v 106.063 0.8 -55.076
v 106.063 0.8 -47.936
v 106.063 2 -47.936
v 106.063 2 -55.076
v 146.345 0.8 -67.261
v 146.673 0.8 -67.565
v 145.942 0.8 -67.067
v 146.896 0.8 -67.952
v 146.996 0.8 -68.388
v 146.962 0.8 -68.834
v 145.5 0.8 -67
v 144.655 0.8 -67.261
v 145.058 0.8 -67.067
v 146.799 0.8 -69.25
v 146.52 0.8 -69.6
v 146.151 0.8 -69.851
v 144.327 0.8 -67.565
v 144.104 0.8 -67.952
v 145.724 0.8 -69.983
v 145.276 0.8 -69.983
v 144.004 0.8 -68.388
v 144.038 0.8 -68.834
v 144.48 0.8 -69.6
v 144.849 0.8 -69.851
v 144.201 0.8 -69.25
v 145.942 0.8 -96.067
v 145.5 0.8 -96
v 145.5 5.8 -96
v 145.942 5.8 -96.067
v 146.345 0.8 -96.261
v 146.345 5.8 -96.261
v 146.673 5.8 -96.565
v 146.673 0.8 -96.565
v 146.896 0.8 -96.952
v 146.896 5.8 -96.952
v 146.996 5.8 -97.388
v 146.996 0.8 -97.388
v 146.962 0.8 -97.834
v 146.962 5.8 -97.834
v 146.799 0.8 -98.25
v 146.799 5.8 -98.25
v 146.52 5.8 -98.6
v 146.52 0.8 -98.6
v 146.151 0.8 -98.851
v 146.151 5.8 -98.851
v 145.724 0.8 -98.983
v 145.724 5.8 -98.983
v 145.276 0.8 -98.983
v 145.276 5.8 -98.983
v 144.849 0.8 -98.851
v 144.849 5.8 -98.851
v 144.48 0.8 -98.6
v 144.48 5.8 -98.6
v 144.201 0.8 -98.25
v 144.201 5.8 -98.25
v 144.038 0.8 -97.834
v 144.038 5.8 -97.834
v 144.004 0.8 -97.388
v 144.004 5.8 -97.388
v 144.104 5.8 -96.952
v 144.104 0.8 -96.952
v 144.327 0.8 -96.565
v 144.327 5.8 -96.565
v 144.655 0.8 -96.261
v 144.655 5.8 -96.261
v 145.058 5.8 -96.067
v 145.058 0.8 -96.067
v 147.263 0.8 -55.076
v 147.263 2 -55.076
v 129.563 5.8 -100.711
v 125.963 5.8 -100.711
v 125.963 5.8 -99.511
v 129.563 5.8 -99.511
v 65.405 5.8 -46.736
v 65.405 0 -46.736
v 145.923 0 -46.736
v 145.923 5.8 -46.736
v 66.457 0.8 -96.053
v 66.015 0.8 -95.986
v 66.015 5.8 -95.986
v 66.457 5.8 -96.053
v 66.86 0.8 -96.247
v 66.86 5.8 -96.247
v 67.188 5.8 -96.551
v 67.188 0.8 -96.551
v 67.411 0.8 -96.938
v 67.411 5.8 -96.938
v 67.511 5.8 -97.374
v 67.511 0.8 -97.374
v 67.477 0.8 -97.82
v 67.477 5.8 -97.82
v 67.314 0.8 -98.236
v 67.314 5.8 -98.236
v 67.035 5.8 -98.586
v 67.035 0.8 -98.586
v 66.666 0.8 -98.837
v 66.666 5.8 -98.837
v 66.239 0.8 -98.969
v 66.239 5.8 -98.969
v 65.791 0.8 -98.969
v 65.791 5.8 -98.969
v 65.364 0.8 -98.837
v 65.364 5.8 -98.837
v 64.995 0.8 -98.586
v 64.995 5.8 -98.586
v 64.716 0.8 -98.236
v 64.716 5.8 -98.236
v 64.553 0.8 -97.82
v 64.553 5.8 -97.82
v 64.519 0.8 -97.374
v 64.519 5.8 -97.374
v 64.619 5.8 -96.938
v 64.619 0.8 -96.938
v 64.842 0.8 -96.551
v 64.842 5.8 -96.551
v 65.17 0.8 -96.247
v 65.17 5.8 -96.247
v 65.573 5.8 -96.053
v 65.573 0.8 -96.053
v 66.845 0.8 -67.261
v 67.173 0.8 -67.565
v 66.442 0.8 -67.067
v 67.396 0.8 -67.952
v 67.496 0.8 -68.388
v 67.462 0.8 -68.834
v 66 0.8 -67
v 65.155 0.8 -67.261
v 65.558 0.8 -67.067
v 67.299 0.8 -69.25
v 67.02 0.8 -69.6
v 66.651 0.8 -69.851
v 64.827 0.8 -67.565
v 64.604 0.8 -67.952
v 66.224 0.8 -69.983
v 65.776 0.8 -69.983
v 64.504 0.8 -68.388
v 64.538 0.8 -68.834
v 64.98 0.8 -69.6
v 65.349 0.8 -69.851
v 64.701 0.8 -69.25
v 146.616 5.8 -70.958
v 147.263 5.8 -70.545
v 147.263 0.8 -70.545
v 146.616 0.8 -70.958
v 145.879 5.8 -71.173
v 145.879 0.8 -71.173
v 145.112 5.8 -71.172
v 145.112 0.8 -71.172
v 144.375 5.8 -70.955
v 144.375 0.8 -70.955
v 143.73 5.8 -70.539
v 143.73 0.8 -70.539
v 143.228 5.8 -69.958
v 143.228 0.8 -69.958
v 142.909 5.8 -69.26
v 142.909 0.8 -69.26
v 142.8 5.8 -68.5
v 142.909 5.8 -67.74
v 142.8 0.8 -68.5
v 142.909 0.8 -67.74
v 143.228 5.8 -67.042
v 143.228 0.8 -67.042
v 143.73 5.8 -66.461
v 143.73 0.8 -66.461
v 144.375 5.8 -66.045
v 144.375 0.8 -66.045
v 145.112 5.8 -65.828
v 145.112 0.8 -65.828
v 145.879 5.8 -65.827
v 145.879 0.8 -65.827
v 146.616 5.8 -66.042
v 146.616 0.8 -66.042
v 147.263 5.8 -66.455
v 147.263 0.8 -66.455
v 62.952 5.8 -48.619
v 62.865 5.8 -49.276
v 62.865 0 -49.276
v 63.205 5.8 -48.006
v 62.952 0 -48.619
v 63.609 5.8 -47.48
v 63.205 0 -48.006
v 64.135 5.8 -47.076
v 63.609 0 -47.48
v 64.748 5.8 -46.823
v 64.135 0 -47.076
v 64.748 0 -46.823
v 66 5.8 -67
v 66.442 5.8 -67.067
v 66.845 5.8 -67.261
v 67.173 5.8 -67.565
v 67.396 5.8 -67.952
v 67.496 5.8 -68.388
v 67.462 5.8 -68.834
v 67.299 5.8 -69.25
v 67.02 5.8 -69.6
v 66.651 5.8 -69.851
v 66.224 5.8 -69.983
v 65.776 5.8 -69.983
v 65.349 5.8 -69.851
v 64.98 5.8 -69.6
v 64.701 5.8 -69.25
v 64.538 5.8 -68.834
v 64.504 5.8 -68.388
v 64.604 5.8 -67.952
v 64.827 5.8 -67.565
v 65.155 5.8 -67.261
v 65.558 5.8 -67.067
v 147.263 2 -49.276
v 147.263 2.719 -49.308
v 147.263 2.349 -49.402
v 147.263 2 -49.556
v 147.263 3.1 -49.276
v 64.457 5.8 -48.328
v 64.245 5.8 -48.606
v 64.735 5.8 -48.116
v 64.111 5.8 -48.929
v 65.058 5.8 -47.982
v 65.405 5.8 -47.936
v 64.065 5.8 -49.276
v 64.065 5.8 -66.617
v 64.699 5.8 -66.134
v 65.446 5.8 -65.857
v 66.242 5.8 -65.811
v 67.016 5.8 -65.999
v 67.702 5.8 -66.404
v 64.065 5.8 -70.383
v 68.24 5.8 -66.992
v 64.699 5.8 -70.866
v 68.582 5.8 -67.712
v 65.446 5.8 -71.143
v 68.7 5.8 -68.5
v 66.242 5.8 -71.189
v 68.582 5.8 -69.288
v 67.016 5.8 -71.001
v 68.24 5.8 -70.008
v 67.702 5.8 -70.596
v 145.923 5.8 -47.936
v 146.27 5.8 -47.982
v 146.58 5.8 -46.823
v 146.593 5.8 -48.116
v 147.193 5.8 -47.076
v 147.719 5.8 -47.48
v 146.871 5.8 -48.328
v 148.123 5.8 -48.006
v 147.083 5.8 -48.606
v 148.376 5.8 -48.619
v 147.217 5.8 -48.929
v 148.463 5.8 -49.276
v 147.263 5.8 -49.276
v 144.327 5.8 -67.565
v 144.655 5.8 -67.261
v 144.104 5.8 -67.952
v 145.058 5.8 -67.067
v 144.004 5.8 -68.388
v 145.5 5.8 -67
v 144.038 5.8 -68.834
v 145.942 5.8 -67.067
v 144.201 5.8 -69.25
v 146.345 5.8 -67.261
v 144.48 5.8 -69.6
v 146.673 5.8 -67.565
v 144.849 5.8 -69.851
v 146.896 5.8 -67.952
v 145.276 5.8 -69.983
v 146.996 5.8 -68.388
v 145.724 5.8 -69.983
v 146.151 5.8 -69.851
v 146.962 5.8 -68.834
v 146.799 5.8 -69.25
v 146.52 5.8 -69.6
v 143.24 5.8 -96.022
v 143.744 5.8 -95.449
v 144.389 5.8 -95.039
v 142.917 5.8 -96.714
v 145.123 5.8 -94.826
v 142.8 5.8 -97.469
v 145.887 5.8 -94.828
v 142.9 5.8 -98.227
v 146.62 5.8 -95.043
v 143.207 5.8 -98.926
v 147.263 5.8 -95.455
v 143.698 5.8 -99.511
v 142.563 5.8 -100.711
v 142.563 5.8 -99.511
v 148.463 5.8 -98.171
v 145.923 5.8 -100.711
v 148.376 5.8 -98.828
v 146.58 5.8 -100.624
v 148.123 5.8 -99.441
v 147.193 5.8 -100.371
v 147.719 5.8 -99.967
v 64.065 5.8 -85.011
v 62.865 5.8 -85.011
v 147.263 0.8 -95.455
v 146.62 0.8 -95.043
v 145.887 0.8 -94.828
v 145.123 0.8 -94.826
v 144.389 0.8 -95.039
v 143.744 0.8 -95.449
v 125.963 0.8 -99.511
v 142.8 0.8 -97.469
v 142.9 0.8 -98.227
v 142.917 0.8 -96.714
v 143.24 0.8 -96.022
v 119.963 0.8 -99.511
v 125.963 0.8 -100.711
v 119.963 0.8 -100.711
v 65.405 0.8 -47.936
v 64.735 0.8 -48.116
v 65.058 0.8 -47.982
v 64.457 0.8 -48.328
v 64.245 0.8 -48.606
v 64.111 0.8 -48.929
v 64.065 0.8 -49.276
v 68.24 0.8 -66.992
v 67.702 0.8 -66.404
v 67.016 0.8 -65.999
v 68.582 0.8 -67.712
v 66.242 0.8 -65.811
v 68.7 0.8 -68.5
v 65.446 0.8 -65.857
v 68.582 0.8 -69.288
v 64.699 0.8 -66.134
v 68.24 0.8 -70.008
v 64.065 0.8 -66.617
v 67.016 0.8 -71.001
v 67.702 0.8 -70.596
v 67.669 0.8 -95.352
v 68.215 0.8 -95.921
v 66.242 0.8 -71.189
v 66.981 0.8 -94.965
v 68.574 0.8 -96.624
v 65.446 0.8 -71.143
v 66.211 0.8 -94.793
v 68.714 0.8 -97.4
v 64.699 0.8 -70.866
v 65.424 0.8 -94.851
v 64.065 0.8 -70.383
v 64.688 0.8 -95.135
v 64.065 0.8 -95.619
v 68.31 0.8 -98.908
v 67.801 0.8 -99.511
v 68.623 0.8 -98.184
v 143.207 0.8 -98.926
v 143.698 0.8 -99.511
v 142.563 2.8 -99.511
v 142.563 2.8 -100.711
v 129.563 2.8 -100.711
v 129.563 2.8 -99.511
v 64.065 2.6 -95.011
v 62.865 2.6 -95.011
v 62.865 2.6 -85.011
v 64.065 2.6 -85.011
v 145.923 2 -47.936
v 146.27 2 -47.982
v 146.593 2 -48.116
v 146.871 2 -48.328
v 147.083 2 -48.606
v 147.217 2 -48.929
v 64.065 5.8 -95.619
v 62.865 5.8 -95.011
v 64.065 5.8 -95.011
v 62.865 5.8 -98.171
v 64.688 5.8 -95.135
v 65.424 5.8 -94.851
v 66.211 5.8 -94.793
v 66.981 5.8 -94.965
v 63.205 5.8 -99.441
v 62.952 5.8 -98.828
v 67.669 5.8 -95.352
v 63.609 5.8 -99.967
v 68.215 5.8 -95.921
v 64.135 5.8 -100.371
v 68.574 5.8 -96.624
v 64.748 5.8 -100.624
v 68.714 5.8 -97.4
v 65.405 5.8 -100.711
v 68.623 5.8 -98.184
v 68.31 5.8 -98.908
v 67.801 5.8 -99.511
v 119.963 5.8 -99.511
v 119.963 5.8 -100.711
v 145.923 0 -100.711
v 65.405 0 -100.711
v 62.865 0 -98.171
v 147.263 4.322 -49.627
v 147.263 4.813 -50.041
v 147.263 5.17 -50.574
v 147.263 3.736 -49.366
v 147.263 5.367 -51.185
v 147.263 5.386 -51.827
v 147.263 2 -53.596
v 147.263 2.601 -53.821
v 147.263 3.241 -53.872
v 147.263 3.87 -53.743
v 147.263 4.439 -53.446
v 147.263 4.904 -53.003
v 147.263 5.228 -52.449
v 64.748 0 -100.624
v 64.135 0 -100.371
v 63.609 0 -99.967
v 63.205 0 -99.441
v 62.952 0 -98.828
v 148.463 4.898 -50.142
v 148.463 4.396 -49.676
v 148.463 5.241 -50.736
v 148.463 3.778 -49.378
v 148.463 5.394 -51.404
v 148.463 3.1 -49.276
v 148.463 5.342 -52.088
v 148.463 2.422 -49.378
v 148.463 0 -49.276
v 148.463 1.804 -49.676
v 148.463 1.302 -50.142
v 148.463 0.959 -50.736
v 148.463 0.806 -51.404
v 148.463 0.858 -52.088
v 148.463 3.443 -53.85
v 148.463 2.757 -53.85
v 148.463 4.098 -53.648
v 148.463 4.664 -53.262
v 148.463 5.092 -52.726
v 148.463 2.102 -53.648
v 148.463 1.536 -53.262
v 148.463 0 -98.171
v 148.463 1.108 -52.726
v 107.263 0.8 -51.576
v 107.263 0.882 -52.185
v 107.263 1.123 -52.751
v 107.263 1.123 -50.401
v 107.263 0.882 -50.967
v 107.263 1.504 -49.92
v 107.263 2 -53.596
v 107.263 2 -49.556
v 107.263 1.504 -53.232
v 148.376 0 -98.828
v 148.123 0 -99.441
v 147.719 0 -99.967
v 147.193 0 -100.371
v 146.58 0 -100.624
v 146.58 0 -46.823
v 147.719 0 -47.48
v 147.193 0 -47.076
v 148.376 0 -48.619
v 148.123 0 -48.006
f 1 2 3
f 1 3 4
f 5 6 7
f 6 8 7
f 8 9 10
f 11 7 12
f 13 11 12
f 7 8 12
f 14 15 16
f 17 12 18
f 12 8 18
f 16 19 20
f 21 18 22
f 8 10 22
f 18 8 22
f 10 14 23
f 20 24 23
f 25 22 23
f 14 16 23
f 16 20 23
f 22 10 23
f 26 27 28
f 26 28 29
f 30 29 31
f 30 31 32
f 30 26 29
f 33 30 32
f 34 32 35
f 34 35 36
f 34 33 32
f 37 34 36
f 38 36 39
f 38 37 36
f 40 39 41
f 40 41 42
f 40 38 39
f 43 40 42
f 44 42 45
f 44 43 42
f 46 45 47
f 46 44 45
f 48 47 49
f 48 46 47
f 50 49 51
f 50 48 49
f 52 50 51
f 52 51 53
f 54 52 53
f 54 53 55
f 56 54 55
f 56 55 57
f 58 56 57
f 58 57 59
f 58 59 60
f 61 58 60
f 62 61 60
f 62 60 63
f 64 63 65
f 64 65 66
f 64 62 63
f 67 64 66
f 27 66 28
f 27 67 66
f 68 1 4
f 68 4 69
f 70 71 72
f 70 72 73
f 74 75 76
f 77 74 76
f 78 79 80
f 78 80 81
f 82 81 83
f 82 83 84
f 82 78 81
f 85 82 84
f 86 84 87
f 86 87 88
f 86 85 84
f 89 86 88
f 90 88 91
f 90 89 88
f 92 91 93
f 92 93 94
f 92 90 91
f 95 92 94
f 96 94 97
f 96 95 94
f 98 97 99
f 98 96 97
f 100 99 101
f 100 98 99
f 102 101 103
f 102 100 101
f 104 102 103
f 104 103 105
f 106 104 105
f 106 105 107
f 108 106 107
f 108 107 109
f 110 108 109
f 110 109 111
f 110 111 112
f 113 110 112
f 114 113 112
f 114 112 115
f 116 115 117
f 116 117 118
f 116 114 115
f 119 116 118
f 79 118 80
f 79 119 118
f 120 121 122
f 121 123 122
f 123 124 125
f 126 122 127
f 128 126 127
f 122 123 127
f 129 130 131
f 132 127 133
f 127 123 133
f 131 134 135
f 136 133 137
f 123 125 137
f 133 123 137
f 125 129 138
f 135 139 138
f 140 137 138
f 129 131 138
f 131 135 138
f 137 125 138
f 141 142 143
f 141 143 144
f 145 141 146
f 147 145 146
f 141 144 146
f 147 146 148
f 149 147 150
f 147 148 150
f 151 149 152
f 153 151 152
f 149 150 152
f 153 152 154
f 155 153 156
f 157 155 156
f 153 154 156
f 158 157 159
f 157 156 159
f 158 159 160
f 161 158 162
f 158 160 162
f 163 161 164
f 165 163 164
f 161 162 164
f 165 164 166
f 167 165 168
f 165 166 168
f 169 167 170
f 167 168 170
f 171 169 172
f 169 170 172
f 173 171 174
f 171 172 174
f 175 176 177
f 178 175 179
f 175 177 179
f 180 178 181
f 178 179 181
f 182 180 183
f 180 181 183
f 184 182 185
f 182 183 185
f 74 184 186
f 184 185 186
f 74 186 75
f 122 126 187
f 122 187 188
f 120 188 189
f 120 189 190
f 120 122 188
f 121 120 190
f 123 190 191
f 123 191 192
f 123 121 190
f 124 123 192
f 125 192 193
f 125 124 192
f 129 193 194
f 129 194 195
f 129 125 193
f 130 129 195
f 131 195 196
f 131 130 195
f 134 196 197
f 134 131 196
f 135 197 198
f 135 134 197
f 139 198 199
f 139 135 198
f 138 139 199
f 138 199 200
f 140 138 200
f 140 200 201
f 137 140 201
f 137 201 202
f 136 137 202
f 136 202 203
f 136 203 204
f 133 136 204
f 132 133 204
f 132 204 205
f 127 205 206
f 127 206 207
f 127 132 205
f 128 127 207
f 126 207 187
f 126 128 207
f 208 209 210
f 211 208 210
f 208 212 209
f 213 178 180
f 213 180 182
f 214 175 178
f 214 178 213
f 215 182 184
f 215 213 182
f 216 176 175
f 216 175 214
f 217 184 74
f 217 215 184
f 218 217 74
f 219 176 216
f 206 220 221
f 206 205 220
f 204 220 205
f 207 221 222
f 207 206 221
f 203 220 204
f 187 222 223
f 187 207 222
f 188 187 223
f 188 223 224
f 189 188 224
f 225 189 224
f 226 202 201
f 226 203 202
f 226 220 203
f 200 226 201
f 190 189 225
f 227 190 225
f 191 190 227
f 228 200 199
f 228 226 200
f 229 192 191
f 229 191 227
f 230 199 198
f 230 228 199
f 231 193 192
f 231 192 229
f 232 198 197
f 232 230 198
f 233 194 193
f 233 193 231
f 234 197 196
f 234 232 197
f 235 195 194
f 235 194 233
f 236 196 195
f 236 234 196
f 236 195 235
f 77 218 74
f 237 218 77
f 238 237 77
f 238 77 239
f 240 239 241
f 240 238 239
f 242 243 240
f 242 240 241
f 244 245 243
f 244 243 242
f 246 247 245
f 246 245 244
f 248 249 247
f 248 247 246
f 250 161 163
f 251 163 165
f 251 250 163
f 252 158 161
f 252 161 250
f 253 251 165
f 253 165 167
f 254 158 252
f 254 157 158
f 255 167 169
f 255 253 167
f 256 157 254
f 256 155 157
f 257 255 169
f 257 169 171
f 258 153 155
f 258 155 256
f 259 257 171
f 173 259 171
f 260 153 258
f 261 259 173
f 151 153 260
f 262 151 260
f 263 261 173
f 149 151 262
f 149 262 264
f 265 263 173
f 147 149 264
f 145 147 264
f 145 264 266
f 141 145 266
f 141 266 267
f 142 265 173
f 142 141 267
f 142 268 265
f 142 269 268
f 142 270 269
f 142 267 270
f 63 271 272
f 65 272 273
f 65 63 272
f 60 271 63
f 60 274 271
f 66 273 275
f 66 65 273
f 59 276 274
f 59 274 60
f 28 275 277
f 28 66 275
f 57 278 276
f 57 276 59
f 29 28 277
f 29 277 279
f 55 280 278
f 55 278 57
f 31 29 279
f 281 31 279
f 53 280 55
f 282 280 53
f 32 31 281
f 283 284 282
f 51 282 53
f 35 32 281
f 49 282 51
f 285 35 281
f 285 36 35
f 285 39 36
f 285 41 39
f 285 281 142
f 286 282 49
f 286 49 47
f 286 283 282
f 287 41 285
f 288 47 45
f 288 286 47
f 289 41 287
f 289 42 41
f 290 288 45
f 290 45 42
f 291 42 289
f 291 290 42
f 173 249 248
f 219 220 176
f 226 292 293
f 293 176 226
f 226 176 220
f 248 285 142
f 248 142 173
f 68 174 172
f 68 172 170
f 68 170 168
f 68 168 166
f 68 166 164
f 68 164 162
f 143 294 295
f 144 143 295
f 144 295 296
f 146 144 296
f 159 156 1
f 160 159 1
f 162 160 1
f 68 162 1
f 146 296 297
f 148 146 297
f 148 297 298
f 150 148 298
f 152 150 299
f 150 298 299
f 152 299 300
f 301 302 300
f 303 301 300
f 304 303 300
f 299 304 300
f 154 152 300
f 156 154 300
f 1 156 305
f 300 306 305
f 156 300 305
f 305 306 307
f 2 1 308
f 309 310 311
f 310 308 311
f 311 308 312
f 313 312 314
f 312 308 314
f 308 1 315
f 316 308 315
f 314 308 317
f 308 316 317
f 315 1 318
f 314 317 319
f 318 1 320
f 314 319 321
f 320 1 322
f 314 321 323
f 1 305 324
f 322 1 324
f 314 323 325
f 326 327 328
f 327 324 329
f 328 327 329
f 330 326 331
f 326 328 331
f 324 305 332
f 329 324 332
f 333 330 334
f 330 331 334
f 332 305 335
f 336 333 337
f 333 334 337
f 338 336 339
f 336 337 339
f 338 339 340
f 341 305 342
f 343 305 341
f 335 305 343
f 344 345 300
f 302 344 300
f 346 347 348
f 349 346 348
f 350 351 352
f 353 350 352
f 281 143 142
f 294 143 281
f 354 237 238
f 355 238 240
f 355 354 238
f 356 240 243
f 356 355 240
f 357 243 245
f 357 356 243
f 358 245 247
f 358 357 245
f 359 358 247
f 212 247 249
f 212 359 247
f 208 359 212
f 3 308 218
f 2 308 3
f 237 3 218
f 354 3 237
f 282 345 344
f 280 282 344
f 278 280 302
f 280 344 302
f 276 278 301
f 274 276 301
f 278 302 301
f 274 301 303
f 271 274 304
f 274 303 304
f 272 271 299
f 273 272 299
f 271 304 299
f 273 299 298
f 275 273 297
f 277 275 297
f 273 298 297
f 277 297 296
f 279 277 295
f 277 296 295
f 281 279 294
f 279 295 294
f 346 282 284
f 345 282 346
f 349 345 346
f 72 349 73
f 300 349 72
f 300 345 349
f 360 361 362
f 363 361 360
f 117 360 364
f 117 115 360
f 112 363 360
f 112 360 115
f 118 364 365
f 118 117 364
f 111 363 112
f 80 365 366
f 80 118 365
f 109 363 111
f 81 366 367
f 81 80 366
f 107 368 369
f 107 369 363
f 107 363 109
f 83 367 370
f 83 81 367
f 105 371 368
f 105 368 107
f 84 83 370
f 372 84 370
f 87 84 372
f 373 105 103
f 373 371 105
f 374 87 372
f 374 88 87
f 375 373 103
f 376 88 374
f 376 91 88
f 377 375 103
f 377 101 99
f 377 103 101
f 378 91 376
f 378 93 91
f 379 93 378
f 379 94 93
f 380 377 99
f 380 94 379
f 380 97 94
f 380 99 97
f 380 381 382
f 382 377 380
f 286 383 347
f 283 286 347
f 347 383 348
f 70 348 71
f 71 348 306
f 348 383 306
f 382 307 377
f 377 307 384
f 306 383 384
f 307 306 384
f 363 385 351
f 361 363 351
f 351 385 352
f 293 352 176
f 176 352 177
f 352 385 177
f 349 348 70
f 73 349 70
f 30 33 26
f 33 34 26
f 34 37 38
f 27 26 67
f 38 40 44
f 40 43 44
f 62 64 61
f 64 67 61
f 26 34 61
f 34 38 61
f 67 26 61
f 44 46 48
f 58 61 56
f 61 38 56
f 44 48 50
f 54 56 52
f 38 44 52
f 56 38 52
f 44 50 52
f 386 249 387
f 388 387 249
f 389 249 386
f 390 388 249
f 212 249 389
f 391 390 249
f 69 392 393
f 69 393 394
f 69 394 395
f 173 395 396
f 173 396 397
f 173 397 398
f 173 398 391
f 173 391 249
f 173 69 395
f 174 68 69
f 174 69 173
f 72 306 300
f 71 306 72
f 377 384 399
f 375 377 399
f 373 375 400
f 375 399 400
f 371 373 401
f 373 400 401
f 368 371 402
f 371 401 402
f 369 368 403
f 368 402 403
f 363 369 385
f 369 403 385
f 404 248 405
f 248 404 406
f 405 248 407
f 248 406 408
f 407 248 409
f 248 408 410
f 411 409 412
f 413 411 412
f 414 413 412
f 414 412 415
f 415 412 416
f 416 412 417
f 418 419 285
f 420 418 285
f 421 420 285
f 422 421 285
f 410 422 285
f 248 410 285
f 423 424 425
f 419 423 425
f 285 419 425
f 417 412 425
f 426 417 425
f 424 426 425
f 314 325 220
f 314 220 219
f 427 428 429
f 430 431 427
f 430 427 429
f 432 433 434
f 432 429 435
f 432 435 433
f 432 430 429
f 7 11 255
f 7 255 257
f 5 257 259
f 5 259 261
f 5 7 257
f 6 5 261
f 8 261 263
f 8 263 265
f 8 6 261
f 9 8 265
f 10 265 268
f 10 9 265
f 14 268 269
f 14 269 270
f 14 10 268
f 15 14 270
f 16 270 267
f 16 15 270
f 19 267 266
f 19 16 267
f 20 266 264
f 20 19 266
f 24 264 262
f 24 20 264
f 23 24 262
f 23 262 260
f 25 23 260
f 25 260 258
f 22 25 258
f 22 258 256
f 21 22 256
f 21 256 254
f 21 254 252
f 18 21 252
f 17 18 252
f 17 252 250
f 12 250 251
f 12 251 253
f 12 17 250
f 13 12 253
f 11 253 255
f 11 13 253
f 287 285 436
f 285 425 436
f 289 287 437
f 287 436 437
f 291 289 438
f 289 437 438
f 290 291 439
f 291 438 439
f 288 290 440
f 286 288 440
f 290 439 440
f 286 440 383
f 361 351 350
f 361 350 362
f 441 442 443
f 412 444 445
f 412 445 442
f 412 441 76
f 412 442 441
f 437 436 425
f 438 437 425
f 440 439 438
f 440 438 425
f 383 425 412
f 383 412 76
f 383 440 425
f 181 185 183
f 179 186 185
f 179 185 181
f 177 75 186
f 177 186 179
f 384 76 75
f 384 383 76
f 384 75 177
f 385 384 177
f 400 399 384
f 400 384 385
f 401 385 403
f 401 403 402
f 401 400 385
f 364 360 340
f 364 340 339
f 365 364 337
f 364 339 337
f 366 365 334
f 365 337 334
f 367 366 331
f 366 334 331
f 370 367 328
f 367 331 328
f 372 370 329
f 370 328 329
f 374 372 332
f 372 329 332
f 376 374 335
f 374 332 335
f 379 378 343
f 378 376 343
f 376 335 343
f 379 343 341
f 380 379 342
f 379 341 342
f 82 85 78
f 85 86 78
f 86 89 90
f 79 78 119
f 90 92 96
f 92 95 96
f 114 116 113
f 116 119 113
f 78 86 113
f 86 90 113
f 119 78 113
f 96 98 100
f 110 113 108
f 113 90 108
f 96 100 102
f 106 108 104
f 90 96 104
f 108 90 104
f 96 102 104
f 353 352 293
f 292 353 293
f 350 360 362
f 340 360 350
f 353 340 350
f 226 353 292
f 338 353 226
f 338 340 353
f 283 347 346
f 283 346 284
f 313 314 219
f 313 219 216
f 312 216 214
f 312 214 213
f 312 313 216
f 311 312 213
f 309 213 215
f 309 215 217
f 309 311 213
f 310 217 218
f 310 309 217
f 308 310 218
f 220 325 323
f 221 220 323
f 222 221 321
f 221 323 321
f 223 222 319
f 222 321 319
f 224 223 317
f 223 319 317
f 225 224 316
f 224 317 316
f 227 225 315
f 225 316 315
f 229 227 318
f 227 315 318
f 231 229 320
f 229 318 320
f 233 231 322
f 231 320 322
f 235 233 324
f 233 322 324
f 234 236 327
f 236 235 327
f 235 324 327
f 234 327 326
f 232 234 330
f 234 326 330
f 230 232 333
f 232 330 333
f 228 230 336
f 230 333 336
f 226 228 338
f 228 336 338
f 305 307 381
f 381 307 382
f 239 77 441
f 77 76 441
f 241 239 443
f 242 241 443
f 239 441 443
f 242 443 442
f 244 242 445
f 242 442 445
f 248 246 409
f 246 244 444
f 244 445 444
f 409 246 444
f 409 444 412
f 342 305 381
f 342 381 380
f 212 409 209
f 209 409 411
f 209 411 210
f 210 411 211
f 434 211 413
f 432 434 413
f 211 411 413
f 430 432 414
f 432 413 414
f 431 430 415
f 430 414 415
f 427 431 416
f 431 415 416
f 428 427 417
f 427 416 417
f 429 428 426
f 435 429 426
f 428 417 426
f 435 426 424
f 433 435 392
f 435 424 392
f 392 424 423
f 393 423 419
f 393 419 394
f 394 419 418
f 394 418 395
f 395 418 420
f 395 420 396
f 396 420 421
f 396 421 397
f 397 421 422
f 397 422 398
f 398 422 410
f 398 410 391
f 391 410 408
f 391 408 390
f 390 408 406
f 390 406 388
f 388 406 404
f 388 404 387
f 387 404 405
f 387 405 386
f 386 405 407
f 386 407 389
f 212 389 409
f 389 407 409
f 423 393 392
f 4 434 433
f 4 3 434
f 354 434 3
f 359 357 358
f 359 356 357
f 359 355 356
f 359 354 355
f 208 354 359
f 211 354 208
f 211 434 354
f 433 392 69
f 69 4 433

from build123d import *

# Parameters (mm, degrees)
BOSS_EXTRUDE1_DEPTH = 0.8
BOSS_EXTRUDE2_DEPTH = 5
SKETCH4_W           = 10
SKETCH4_H           = 3.2
CUT_EXTRUDE1_DEPTH  = 1.2
SKETCH6_W           = 6
SKETCH6_H           = 5
CUT_EXTRUDE2_DEPTH  = 1.2
SKETCH7_W           = 13
SKETCH7_H           = 3
CUT_EXTRUDE3_DEPTH  = 1.2
SKETCH8_R           = 2.7
SKETCH8_R_2         = 1.5
BOSS_EXTRUDE4_DEPTH = 5
SKETCH9_R           = 2.7
SKETCH9_R_2         = 1.5
BOSS_EXTRUDE5_DEPTH = 5
SKETCH10_R          = 2.7
SKETCH10_R_2        = 1.5
BOSS_EXTRUDE6_DEPTH = 5
SKETCH11_R          = 2.7
SKETCH11_R_2        = 1.5
BOSS_EXTRUDE7_DEPTH = 5
SKETCH13_R          = 2.3
CUT_EXTRUDE8_DEPTH  = 5
SKETCH15_W          = 41.2
SKETCH15_H          = 7.14
BOSS_EXTRUDE9_DEPTH = 1.2
SKETCH16_R          = 2.3
CUT_EXTRUDE9_DEPTH  = 40


with BuildPart() as part:
    # Sketch1 → Boss-Extrude1 (new body)
    with BuildSketch(Plane(origin=(0, 0, 0), x_dir=(1, 0, 0), z_dir=(0, 1, 0))):
        with BuildLine():
            Line((62.865, 49.276), (62.865, 98.171))
            ThreePointArc((62.865, 98.171), (63.608948776, 99.967051224), (65.405, 100.711))
            Line((65.405, 100.711), (145.923, 100.711))
            ThreePointArc((145.923, 100.711), (147.719051224, 99.967051224), (148.463, 98.171))
            Line((148.463, 98.171), (148.463, 49.276))
            ThreePointArc((148.463, 49.276), (147.719051224, 47.479948776), (145.923, 46.736))
            Line((145.923, 46.736), (65.405, 46.736))
            ThreePointArc((65.405, 46.736), (63.608948776, 47.479948776), (62.865, 49.276))
        make_face()
    extrude(amount=BOSS_EXTRUDE1_DEPTH)

    # Sketch3 → Boss-Extrude2 (add)
    with BuildSketch(Plane(origin=(0, 0.8, 0), x_dir=(1, 0, 0), z_dir=(0, 1, 0))):
        with BuildLine():
            Line((65.405, 46.736), (145.923, 46.736))
            ThreePointArc((145.923, 46.736), (147.719051224, 47.479948776), (148.463, 49.276))
            Line((148.463, 49.276), (148.463, 98.171))
            ThreePointArc((148.463, 98.171), (147.719051224, 99.967051224), (145.923, 100.711))
            Line((145.923, 100.711), (65.405, 100.711))
            ThreePointArc((65.405, 100.711), (63.608948776, 99.967051224), (62.865, 98.171))
            Line((62.865, 98.171), (62.865, 49.276))
            ThreePointArc((62.865, 49.276), (63.608948776, 47.479948776), (65.405, 46.736))
        make_face()
        with BuildLine():
            Line((64.065, 98.171), (64.065, 49.276))
            ThreePointArc((64.065, 49.276), (64.457476913, 48.328476913), (65.405, 47.936))
            Line((65.405, 47.936), (145.923, 47.936))
            ThreePointArc((145.923, 47.936), (146.870523087, 48.328476913), (147.263, 49.276))
            Line((147.263, 49.276), (147.263, 98.171))
            ThreePointArc((147.263, 98.171), (146.870523087, 99.118523087), (145.923, 99.511))
            Line((145.923, 99.511), (65.405, 99.511))
            ThreePointArc((65.405, 99.511), (64.457476913, 99.118523087), (64.065, 98.171))
        make_face(mode=Mode.SUBTRACT)
    extrude(amount=BOSS_EXTRUDE2_DEPTH)

    # Sketch4 → Cut-Extrude1 (cut)
    with BuildSketch(Plane.ZY.offset(-62.865)):
        with Locations((-90.011, 4.2)):
            Rectangle(SKETCH4_W, SKETCH4_H)
    extrude(amount=-CUT_EXTRUDE1_DEPTH, mode=Mode.SUBTRACT)

    # Sketch6 → Cut-Extrude2 (cut)
    with BuildSketch(Plane(origin=(0, 0, -100.711), x_dir=(-1, 0, 0), z_dir=(0, 0, -1))):
        with Locations((-122.963, 3.3)):
            Rectangle(SKETCH6_W, SKETCH6_H)
    extrude(amount=-CUT_EXTRUDE2_DEPTH, mode=Mode.SUBTRACT)

    # Sketch7 → Cut-Extrude3 (cut)
    with BuildSketch(Plane(origin=(0, 0, -100.711), x_dir=(-1, 0, 0), z_dir=(0, 0, -1))):
        with Locations((-136.063, 4.3)):
            Rectangle(SKETCH7_W, SKETCH7_H)
    extrude(amount=-CUT_EXTRUDE3_DEPTH, mode=Mode.SUBTRACT)

    # Sketch8 → Boss-Extrude4 (add)
    with BuildSketch(Plane(origin=(0, 0.8, 0), x_dir=(1, 0, 0), z_dir=(0, 1, 0))):
        with Locations((66.015, 97.486)):
            Circle(SKETCH8_R)
        with Locations(Location((66.015, 97.486, 0), (0, 0, 270))):
            Circle(SKETCH8_R_2, mode=Mode.SUBTRACT)
    extrude(amount=BOSS_EXTRUDE4_DEPTH)

    # Sketch9 → Boss-Extrude5 (add)
    with BuildSketch(Plane(origin=(0, 0.8, 0), x_dir=(1, 0, 0), z_dir=(0, 1, 0))):
        with Locations((145.5, 97.5)):
            Circle(SKETCH9_R)
        with Locations(Location((145.5, 97.5, 0), (0, 0, 270))):
            Circle(SKETCH9_R_2, mode=Mode.SUBTRACT)
    extrude(amount=BOSS_EXTRUDE5_DEPTH)

    # Sketch10 → Boss-Extrude6 (add)
    with BuildSketch(Plane(origin=(0, 0.8, 0), x_dir=(1, 0, 0), z_dir=(0, 1, 0))):
        with Locations((66, 68.5)):
            Circle(SKETCH10_R)
        with Locations(Location((66, 68.5, 0), (0, 0, 270))):
            Circle(SKETCH10_R_2, mode=Mode.SUBTRACT)
    extrude(amount=BOSS_EXTRUDE6_DEPTH)

    # Sketch11 → Boss-Extrude7 (add)
    with BuildSketch(Plane(origin=(0, 0.8, 0), x_dir=(1, 0, 0), z_dir=(0, 1, 0))):
        with Locations((145.5, 68.5)):
            Circle(SKETCH11_R)
        with Locations(Location((145.5, 68.5, 0), (0, 0, 270))):
            Circle(SKETCH11_R_2, mode=Mode.SUBTRACT)
    extrude(amount=BOSS_EXTRUDE7_DEPTH)

    # Sketch13 → Cut-Extrude8 (cut)
    with BuildSketch(Plane(origin=(148.463, 0, 0), x_dir=(0, 0, -1), z_dir=(1, 0, 0))):
        with Locations(Location((51.576, 3.1, 0), (0, 0, 180))):
            Circle(SKETCH13_R)
    extrude(amount=-CUT_EXTRUDE8_DEPTH, mode=Mode.SUBTRACT)

    # Sketch15 → Boss-Extrude9 (add)
    with BuildSketch(Plane(origin=(0, 0.8, 0), x_dir=(1, 0, 0), z_dir=(0, 1, 0))):
        with Locations((126.663, 51.506)):
            Rectangle(SKETCH15_W, SKETCH15_H)
    extrude(amount=BOSS_EXTRUDE9_DEPTH)

    # Sketch16 → Cut-Extrude9 (cut)
    with BuildSketch(Plane(origin=(147.263, 0, 0), x_dir=(0, 0, -1), z_dir=(1, 0, 0))):
        with Locations(Location((51.576, 3.1, 0), (0, 0, 180))):
            Circle(SKETCH16_R)
    extrude(amount=-CUT_EXTRUDE9_DEPTH, mode=Mode.SUBTRACT)


solid = part.part
